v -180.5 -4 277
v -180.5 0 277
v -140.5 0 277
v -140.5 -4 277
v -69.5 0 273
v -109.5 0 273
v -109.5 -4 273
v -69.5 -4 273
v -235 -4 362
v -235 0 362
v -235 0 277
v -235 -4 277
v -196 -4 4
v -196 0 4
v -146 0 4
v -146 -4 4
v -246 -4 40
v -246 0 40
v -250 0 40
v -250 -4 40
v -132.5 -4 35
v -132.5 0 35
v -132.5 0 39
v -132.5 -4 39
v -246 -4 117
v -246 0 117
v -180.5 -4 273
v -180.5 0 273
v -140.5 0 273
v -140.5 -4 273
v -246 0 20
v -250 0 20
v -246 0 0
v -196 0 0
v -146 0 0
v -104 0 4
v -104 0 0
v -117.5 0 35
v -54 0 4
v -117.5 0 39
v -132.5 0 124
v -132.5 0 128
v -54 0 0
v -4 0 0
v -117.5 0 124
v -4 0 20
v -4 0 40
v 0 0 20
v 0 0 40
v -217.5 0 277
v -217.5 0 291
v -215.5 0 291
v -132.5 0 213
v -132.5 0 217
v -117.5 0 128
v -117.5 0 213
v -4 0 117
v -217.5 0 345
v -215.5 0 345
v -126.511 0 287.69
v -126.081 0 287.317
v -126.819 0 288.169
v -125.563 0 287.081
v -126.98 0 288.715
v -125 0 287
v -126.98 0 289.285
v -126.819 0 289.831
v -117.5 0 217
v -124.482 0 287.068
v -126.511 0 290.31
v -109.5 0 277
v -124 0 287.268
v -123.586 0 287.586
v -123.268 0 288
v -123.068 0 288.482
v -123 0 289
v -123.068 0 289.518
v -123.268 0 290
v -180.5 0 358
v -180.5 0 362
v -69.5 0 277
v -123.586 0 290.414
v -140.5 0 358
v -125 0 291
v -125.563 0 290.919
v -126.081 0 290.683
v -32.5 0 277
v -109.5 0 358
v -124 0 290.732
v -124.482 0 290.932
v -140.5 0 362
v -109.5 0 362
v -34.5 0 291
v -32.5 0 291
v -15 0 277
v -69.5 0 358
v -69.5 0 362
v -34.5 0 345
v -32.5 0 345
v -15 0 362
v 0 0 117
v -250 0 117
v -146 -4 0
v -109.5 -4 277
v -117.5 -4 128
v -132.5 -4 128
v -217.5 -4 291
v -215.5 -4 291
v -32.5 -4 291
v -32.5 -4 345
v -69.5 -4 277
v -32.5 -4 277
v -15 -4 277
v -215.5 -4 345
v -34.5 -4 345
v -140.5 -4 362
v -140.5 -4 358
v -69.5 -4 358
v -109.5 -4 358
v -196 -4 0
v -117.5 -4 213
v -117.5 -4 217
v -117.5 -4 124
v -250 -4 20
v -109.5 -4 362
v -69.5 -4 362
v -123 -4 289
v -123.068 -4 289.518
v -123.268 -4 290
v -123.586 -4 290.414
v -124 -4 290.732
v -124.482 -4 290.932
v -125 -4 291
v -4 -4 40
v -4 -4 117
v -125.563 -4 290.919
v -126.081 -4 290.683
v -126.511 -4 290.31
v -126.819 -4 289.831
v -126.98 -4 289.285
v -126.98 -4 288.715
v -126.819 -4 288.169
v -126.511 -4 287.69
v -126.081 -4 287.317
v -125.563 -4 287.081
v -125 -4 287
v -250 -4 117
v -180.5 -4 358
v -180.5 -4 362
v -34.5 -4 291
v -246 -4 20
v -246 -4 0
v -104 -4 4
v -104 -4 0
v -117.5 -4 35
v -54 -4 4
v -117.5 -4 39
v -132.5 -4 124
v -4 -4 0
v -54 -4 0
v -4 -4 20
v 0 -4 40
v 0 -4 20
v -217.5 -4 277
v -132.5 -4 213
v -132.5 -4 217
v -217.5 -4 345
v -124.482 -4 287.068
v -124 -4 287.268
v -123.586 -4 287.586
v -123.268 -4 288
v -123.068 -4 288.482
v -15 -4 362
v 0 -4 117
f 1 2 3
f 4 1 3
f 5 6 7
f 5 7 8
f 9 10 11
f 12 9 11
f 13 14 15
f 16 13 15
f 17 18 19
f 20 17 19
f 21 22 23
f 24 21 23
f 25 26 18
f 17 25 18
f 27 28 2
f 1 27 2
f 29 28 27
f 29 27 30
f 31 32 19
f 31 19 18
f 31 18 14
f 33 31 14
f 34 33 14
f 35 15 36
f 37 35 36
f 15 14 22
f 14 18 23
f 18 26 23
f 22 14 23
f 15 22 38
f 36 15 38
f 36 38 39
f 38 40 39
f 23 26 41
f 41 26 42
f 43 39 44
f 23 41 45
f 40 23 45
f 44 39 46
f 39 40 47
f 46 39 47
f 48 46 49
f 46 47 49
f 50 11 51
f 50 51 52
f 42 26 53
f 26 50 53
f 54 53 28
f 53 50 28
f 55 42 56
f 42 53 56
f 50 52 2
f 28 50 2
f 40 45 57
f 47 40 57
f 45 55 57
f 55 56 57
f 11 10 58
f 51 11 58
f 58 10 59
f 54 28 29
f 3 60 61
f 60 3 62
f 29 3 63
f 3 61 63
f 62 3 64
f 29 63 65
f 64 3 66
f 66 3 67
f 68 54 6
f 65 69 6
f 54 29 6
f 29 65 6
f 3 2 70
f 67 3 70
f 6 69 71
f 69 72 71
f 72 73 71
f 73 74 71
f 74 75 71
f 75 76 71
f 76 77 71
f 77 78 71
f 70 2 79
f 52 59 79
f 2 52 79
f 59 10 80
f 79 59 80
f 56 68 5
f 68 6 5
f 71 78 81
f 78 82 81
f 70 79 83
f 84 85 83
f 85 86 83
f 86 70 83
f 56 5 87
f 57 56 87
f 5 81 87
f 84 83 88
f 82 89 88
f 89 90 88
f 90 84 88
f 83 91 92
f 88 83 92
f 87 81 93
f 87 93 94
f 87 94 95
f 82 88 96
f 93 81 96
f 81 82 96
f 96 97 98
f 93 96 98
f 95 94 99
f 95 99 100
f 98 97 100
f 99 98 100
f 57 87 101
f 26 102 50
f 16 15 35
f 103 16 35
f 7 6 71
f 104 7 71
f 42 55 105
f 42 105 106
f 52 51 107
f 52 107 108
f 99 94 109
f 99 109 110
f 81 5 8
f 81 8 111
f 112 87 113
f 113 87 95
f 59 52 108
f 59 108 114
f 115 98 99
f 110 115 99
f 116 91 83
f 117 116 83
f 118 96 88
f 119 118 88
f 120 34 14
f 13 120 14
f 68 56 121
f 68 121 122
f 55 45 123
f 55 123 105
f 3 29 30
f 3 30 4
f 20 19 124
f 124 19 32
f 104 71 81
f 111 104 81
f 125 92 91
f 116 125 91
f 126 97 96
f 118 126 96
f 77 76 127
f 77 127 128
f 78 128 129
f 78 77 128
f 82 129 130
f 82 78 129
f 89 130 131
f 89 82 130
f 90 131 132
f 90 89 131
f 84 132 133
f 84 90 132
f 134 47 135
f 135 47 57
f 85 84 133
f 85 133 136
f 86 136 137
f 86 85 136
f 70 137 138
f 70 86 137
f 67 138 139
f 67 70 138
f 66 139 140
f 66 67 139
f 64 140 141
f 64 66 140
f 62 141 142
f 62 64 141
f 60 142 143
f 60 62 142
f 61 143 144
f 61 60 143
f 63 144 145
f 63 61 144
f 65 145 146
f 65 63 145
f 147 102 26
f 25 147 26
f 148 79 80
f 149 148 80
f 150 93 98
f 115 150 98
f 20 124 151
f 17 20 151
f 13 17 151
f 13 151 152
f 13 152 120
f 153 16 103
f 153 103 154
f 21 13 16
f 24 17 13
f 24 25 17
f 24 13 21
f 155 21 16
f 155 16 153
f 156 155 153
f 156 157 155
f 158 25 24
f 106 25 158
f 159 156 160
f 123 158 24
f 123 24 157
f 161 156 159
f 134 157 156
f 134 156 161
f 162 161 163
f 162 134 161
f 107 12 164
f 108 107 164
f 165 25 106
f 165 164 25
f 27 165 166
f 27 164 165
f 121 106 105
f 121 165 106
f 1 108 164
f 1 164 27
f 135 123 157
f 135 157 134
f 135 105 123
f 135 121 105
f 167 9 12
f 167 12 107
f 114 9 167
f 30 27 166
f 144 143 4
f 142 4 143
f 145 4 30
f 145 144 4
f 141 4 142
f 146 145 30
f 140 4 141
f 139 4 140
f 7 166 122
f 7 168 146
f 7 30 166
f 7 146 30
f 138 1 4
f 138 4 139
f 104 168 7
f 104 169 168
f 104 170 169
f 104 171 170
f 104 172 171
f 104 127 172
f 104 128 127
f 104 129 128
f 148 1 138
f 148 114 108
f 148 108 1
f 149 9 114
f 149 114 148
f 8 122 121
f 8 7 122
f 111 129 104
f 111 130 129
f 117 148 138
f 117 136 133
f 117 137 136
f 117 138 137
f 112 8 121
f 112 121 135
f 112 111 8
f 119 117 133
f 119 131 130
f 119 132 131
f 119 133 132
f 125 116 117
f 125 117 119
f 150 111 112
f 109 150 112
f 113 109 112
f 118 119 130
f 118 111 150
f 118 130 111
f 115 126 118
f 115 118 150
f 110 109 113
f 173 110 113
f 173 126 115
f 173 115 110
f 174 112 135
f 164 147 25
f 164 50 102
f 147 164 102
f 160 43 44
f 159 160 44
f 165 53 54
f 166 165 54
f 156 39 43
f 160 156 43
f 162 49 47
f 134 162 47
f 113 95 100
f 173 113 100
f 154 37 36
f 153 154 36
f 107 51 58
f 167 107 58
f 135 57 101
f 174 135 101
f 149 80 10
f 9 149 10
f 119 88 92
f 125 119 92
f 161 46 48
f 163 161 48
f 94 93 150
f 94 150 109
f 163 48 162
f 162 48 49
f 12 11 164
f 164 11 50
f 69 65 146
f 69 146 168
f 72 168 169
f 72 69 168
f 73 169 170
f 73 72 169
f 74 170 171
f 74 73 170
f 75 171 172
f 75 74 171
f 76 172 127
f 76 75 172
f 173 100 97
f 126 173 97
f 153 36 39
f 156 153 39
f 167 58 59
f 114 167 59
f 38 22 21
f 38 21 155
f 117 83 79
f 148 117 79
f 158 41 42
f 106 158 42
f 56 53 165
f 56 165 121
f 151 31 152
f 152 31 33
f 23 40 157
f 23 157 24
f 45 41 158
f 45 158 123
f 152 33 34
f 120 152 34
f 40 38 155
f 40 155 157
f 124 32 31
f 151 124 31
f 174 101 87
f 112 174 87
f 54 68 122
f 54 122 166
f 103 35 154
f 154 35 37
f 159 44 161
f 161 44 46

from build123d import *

# Parameters (mm, degrees)
F0_W     = 40
F0_H     = 4
F1_DEPTH = 4
F2_W     = 2
F2_H     = 54
F2_W_2   = 7.5
F2_H_2   = 4
F3_DEPTH = 4


with BuildPart() as f1:
    # F0 (on Front) → F1 (new body)
    with BuildSketch(Plane.XZ):
        Polygon((-54, 0), (-4, 0), (-4, 20), (0, 20), (0, 40), (-4, 40), (-4, 117), (0, 117), (-32.5, 277), (-15, 277), (-15, 362), (-69.5, 362), (-69.5, 358), (-109.5, 358), (-109.5, 362), (-140.5, 362), (-140.5, 358), (-180.5, 358), (-180.5, 362), (-235, 362), (-235, 277), (-217.5, 277), (-250, 117), (-246, 117), (-246, 40), (-250, 40), (-250, 20), (-246, 20), (-246, 0), (-196, 0), (-196, 4), (-146, 4), (-146, 0), (-104, 0), (-104, 4), (-54, 4), align=None)
        with Locations((-160.5, 275)):
            Rectangle(F0_W, F0_H, mode=Mode.SUBTRACT)
        with Locations((-89.5, 275)):
            Rectangle(F0_W, F0_H, mode=Mode.SUBTRACT)
    extrude(amount=F1_DEPTH)

    # F2 (on Front) → F3 (cut)
    with BuildSketch(Plane.XZ):
        with Locations((-33.5, 318)):
            Rectangle(F2_W, F2_H)
        with Locations((-216.5, 318)):
            Rectangle(F2_W, F2_H)
        with BuildLine():
            ThreePointArc((-125, 287), (-123.5857864376, 287.5857864376), (-123, 289))
            ThreePointArc((-123, 289), (-123.5857864376, 290.4142135624), (-125, 291))
            Line((-125, 291), (-125, 287))
        make_face()
        with Locations((-121.25, 37)):
            Rectangle(F2_W_2, F2_H_2)
        with Locations((-128.75, 37)):
            Rectangle(F2_W_2, F2_H_2)
        with Locations((-121.25, 126)):
            Rectangle(F2_W_2, F2_H_2)
        with Locations((-128.75, 126)):
            Rectangle(F2_W_2, F2_H_2)
        with Locations((-121.25, 215)):
            Rectangle(F2_W_2, F2_H_2)
        with Locations((-128.75, 215)):
            Rectangle(F2_W_2, F2_H_2)
        with BuildLine():
            Line((-125, 287), (-125, 291))
            ThreePointArc((-125, 291), (-127, 289), (-125, 287))
        make_face()
    extrude(amount=F3_DEPTH, mode=Mode.SUBTRACT)


solid = f1.part
